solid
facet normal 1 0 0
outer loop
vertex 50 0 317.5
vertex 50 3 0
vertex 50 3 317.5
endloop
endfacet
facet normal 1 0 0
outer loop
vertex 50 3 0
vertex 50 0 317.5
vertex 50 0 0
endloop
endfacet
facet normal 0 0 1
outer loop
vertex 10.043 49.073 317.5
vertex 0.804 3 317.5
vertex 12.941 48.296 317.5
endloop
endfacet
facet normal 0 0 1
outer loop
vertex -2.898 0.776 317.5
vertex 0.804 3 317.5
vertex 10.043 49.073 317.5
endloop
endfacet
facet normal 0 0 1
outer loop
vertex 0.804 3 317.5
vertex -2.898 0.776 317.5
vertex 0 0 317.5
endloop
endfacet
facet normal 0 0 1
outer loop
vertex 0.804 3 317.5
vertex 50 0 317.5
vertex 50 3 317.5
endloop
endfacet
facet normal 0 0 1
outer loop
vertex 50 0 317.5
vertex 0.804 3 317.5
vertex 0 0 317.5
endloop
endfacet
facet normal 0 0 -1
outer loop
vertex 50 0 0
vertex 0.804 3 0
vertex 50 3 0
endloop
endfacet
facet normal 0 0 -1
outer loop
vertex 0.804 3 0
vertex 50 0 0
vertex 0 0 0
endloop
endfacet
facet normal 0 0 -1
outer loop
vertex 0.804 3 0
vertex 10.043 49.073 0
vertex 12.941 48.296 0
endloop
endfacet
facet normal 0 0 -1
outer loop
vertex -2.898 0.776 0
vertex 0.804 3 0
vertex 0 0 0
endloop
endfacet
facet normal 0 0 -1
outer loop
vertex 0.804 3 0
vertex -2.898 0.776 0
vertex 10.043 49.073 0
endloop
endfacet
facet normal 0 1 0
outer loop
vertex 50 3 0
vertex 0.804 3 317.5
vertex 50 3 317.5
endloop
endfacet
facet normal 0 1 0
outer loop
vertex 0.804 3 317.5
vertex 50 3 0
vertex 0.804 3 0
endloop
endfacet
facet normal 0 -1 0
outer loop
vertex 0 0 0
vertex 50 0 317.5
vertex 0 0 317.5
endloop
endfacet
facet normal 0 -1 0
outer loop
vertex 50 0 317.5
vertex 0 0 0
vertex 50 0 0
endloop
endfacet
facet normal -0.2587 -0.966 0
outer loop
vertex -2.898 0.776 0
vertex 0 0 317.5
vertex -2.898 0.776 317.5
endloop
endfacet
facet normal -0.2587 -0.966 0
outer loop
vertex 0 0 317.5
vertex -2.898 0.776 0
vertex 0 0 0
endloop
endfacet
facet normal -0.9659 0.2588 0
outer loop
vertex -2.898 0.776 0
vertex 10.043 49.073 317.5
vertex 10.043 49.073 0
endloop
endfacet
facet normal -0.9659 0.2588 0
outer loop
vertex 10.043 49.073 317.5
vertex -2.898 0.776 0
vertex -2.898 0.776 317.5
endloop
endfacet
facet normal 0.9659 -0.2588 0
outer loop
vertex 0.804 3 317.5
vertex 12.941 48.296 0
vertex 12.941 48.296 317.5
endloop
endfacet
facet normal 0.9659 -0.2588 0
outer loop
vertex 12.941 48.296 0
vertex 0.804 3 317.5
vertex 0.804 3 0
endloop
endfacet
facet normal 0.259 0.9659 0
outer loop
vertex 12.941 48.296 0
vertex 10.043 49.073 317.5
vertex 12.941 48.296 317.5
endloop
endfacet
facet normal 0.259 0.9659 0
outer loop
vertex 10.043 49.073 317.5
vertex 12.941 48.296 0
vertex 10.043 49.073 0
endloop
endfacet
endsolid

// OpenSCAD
cube([50,3,317.5]);
rotate([0,0,75]){
    cube([50,3,317.5]);
}
